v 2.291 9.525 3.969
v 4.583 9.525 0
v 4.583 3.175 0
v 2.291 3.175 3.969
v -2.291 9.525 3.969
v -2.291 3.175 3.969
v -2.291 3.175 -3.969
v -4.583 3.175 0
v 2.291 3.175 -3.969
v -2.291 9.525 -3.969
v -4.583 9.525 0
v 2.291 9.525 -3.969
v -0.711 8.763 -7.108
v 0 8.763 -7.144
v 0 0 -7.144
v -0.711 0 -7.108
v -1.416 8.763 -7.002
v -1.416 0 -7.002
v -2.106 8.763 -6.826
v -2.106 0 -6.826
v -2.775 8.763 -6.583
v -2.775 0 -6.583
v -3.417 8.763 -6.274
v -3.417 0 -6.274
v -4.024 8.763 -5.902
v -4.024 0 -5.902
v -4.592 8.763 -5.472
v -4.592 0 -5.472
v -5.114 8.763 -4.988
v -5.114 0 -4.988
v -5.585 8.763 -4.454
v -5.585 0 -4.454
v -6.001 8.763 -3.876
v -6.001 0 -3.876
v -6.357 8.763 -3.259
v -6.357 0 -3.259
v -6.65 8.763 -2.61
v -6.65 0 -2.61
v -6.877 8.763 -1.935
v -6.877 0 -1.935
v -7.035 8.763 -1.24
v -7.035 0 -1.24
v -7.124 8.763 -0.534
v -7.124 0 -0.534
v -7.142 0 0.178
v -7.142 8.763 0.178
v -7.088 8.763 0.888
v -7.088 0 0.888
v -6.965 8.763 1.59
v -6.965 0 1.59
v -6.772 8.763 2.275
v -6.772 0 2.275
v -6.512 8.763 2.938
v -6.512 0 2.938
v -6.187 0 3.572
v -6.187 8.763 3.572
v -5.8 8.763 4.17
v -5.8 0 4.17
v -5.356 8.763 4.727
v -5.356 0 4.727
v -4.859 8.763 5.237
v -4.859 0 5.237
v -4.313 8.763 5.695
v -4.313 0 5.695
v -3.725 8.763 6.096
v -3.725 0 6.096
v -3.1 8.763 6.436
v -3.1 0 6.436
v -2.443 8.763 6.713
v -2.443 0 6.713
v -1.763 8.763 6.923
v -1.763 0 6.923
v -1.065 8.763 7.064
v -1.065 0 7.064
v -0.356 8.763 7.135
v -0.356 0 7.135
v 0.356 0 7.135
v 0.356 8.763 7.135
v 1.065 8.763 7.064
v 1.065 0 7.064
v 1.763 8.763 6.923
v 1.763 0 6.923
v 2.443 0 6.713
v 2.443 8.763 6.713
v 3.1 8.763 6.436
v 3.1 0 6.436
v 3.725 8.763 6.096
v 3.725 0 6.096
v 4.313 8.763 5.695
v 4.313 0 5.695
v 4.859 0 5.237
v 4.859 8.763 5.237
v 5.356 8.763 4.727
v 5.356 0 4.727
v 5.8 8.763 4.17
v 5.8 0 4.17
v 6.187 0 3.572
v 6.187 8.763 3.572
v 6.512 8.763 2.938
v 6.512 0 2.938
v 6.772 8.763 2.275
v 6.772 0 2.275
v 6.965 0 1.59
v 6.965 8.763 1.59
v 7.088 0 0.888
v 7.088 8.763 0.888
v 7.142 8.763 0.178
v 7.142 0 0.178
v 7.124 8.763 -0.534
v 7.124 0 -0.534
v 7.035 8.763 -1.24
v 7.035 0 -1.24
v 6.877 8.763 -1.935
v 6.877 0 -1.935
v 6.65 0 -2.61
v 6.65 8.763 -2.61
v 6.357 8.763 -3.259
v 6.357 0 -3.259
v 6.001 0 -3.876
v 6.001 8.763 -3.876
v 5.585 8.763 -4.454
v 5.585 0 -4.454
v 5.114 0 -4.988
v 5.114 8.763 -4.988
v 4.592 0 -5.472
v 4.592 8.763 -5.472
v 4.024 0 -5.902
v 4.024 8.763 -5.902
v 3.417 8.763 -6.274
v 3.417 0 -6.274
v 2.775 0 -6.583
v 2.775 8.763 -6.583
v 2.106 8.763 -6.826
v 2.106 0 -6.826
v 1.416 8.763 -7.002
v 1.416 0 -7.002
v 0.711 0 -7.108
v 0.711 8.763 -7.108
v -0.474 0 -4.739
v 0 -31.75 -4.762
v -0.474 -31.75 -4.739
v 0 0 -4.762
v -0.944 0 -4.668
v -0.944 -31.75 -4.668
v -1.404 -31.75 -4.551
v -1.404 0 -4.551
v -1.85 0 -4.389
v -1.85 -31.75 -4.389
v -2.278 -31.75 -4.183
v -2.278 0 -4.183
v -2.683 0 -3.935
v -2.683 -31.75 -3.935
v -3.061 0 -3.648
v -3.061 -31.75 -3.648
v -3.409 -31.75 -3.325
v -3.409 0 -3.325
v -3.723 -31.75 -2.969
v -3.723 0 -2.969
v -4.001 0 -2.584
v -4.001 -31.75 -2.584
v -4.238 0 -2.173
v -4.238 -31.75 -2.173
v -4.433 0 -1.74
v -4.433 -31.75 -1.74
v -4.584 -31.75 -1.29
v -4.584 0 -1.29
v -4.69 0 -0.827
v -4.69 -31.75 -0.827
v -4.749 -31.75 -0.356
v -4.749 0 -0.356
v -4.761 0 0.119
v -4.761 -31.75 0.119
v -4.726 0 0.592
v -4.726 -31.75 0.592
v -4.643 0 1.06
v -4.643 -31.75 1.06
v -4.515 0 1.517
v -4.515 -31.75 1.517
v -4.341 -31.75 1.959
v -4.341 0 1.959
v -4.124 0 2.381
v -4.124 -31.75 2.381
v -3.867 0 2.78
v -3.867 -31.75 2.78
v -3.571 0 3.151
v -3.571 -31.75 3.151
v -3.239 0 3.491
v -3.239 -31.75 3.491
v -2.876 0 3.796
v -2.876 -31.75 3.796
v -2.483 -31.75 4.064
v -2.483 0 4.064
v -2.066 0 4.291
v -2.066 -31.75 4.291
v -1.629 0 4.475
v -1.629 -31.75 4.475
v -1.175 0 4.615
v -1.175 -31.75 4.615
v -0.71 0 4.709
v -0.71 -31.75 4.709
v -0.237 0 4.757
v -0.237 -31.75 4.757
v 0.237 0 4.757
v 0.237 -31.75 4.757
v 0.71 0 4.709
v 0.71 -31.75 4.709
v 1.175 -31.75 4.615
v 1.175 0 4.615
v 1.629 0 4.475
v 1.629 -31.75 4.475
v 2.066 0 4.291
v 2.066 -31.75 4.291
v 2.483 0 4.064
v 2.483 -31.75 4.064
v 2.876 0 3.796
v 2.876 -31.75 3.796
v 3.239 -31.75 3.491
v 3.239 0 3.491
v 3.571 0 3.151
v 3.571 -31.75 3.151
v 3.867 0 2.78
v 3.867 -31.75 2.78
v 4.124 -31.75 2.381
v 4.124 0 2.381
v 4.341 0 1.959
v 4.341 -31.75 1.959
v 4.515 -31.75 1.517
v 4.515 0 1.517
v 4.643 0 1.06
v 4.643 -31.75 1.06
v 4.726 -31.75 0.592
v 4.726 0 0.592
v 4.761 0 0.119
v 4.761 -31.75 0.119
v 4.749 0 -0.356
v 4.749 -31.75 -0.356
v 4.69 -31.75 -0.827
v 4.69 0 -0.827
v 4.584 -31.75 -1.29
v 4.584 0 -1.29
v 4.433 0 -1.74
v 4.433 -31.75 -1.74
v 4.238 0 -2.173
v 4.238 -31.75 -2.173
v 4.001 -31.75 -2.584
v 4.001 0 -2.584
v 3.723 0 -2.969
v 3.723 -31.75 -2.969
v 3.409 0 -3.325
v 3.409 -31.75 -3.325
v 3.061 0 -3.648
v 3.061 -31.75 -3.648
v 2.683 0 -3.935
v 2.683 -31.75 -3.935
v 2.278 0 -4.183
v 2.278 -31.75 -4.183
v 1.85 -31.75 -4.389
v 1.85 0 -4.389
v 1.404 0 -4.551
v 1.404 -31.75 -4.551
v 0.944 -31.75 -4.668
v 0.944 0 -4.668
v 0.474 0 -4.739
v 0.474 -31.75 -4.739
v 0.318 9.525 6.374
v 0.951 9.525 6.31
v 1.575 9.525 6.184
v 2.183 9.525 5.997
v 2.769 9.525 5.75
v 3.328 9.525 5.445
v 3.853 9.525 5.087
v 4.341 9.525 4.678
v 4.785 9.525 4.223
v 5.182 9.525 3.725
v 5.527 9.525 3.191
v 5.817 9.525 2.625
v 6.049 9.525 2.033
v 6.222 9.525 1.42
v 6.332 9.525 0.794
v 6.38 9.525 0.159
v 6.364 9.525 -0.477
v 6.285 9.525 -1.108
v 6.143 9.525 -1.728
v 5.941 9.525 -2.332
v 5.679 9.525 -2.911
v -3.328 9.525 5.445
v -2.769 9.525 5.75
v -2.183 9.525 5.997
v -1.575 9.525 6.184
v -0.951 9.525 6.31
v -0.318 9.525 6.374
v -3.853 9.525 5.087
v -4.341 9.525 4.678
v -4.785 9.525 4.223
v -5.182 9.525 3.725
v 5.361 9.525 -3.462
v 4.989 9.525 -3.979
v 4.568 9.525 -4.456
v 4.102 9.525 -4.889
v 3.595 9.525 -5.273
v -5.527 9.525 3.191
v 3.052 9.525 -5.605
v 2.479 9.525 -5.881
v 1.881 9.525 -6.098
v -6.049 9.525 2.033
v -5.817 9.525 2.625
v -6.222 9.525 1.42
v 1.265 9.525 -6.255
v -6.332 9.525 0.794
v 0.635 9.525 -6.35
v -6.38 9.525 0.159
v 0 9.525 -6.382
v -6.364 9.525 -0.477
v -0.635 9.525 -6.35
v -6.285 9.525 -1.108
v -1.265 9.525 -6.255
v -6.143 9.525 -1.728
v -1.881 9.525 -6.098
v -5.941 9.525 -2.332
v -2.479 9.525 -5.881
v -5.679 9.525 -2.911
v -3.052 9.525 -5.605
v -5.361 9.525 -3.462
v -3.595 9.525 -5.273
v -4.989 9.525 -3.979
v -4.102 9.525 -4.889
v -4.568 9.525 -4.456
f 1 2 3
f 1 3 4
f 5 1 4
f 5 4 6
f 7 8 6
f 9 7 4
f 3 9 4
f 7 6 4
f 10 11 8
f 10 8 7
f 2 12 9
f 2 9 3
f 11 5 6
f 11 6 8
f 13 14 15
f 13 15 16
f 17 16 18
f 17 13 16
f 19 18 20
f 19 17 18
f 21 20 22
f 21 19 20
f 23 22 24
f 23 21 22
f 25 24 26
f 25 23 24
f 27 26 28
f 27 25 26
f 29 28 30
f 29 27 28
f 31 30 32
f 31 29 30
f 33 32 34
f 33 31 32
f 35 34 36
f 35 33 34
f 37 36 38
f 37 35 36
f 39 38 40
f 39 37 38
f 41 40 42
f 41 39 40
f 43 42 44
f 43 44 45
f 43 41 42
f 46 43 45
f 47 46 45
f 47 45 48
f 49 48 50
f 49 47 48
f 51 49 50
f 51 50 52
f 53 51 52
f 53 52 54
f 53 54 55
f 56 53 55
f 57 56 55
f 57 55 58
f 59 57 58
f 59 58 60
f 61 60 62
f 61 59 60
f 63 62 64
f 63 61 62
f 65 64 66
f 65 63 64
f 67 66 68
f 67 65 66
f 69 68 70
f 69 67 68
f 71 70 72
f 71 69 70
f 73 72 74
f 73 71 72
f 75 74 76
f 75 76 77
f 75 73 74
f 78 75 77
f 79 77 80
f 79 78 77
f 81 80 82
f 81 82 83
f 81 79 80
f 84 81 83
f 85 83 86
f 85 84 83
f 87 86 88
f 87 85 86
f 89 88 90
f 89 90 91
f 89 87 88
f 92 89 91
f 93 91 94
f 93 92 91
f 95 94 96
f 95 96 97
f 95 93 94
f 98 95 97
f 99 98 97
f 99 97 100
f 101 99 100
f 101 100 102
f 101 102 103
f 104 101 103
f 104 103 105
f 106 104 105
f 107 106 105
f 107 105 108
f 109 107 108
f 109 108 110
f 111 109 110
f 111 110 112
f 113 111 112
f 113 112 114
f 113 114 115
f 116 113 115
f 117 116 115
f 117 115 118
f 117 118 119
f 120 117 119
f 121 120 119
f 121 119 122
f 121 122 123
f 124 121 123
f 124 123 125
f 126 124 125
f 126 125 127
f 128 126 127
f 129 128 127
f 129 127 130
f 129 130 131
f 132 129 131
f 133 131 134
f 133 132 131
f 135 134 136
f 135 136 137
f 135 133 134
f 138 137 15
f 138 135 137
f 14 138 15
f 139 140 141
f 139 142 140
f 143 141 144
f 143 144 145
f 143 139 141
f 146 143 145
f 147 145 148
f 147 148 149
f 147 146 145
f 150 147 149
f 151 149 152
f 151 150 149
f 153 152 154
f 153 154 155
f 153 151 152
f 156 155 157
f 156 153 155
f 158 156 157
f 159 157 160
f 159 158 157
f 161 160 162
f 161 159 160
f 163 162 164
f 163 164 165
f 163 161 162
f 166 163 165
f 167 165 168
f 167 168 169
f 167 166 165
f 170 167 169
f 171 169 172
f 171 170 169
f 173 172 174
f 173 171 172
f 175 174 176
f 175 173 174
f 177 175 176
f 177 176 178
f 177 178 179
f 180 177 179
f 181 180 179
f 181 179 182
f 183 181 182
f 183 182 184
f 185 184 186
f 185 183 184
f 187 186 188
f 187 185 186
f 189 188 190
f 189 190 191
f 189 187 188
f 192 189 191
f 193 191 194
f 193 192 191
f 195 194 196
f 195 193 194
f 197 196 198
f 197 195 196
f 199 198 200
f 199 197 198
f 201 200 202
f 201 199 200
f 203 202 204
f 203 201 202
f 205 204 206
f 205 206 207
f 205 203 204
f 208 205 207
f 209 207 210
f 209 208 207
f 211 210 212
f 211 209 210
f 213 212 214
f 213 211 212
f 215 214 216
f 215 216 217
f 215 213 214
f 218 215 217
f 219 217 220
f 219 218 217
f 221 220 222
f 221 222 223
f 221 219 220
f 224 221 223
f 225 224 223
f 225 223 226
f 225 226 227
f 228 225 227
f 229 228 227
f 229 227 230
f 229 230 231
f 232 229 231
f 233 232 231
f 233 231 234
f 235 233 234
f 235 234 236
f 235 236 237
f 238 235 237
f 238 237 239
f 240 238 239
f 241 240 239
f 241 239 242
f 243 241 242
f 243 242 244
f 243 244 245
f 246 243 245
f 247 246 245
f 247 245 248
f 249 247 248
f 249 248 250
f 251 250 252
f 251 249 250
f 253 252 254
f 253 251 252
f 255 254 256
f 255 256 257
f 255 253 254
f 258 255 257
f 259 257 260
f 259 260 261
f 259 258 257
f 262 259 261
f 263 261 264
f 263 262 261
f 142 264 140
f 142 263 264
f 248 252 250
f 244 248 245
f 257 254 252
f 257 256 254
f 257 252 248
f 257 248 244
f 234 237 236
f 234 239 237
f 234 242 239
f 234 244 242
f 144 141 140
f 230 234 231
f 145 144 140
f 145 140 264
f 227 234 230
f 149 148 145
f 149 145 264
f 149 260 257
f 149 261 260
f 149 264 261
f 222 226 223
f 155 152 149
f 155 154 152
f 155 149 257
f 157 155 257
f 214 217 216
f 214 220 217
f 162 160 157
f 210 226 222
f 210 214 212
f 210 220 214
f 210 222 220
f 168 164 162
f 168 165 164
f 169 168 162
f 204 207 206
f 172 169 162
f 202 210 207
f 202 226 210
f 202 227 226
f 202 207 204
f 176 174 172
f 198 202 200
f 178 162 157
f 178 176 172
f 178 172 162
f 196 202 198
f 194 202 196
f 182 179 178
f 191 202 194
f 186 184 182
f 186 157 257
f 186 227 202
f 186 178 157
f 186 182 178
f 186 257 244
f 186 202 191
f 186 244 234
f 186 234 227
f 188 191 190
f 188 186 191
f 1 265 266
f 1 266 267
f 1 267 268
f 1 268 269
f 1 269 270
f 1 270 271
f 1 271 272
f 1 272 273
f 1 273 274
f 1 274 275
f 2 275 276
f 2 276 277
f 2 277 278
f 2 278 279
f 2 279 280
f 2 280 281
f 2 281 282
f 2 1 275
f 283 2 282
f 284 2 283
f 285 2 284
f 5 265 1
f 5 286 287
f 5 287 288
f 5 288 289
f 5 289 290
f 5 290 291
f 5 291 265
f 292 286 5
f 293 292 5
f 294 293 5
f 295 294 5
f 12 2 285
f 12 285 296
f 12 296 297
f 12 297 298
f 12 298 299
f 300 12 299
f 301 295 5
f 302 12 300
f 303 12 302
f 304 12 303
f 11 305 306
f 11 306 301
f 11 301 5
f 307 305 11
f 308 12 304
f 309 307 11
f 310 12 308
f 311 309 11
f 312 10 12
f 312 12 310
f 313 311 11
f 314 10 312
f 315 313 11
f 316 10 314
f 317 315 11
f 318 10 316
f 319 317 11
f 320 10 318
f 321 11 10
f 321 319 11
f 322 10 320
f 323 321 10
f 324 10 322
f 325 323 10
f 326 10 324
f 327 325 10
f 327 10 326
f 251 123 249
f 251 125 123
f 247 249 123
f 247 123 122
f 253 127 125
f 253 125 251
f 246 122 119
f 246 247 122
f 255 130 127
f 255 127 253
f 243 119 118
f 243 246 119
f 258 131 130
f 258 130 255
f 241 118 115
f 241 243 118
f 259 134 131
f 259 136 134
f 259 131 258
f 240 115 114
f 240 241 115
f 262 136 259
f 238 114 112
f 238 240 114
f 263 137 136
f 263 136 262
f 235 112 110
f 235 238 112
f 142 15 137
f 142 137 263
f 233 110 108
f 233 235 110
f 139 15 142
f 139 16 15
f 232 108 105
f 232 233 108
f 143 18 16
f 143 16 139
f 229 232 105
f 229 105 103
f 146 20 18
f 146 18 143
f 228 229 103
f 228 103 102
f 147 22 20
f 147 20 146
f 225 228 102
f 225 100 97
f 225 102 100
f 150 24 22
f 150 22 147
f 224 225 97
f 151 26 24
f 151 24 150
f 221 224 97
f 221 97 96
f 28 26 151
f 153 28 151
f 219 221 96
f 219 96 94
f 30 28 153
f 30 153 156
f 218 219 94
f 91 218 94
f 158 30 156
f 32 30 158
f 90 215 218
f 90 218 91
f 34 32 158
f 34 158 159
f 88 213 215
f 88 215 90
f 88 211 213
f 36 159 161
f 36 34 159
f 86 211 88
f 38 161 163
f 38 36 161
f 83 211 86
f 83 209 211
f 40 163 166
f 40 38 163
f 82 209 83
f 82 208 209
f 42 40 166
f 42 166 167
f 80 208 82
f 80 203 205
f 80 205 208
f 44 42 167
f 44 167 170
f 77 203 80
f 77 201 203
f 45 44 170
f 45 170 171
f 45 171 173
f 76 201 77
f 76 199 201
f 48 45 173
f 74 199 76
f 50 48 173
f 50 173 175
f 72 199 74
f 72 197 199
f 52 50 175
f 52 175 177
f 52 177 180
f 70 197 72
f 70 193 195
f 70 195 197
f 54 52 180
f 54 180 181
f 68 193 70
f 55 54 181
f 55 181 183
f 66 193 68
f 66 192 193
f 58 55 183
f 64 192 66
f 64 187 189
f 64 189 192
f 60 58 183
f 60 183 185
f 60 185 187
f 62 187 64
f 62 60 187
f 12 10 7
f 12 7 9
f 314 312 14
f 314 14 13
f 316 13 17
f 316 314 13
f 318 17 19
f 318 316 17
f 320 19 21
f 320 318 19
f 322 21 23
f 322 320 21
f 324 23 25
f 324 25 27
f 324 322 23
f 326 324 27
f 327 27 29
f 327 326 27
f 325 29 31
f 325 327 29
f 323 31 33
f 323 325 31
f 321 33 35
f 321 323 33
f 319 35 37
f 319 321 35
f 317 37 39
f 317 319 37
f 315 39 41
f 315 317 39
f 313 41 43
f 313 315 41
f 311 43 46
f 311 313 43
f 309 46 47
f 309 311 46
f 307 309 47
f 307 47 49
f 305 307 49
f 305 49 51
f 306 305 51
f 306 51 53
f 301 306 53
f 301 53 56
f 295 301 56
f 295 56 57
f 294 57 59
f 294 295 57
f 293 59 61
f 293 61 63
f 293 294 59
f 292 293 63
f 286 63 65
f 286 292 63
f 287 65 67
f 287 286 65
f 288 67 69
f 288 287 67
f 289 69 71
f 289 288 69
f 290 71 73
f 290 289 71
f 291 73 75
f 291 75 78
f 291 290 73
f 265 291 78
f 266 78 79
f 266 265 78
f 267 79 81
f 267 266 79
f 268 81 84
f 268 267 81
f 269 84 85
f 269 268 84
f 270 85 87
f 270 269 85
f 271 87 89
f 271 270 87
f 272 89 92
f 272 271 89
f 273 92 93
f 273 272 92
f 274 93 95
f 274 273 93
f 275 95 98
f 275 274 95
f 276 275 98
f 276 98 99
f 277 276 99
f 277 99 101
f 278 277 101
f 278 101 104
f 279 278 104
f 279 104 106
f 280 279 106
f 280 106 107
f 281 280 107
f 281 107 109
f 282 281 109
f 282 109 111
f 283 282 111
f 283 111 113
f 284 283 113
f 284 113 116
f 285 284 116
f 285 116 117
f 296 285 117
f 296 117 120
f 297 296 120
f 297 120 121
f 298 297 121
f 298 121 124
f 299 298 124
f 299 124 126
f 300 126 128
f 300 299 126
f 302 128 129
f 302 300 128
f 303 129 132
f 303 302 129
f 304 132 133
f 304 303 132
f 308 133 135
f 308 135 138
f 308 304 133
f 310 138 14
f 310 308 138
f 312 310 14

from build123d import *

# Parameters (mm, degrees)
CUT_EXTRUDE1_DEPTH = 6.35
CHAMFER1_SIZE      = 0.762


with BuildPart() as part:
    # Sketch1 → Base-Revolve (revolve)
    with BuildSketch(Plane.XY, mode=Mode.PRIVATE) as base_revolve_sk:
        Polygon((4.7625, 0), (7.14375, 0), (7.14375, 9.525), (0, 9.525), (0, -31.75), (4.7625, -31.75), align=None)
    revolve(base_revolve_sk.sketch.rotate(Axis((0, 0, 0), (0, 1, 0)), 90), axis=Axis((0, 0, 0), (0, 1, 0)))

    # Sketch2 → Cut-Extrude1 (cut)
    with BuildSketch(Plane(origin=(0, 9.525, 0), x_dir=(-1, 0, 0), z_dir=(0, 1, 0))):
        Polygon((2.291358881, -3.96875), (-2.291358881, -3.96875), (-4.582717762, 0), (-2.291358881, 3.96875), (2.291358881, 3.96875), (4.582717762, 0), align=None)
    extrude(amount=-CUT_EXTRUDE1_DEPTH, mode=Mode.SUBTRACT)

    # Chamfer1
    chamfer1_edges = [part.edges().sort_by_distance(p)[0] for p in [
        (0, 9.525, 7.14375),
    ]]
    chamfer(chamfer1_edges, length=CHAMFER1_SIZE)


solid = part.part
